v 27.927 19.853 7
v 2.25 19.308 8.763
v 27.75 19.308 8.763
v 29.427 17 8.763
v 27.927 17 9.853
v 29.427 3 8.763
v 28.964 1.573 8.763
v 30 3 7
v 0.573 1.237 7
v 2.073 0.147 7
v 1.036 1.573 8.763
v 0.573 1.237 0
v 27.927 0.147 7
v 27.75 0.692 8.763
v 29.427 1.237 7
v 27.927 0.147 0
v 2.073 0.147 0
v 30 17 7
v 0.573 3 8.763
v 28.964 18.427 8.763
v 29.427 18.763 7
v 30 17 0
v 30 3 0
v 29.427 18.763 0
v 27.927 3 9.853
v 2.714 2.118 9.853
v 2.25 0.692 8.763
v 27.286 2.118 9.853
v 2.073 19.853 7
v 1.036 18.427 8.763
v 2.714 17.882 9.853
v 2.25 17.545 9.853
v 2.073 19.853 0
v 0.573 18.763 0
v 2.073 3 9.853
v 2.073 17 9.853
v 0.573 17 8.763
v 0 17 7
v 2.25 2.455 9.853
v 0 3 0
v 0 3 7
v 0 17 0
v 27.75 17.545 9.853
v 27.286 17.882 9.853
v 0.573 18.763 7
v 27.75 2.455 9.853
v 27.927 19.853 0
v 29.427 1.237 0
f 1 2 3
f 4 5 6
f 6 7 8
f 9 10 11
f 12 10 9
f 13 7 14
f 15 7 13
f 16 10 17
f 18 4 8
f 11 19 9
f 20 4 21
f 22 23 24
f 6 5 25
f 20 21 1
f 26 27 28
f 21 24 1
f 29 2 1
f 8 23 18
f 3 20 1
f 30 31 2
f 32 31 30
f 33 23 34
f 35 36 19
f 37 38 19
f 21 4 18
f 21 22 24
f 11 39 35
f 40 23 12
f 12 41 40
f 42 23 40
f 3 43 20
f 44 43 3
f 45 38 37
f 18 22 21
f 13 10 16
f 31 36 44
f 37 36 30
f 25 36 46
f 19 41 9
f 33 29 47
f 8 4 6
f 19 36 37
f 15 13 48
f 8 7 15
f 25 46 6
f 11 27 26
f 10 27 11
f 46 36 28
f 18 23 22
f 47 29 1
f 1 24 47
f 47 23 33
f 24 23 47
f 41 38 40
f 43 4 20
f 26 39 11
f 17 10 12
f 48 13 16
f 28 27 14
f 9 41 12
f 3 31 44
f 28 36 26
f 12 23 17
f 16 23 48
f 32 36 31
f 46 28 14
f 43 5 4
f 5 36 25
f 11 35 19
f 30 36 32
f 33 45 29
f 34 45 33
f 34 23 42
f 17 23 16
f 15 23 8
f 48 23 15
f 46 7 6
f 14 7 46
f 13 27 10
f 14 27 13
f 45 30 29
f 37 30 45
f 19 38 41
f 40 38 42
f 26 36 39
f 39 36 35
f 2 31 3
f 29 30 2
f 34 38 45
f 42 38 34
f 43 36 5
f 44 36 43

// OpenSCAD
// case 03: the rounded-top box — corner cylinders + corner balls. Exact: 6 planes, 8 cylinders,
// 4 sphere patches.
hull() for (x = [3, 27], y = [3, 17]) { translate([x, y, 0]) cylinder(r = 3, h = 7); translate([x, y, 7]) sphere(3); }
